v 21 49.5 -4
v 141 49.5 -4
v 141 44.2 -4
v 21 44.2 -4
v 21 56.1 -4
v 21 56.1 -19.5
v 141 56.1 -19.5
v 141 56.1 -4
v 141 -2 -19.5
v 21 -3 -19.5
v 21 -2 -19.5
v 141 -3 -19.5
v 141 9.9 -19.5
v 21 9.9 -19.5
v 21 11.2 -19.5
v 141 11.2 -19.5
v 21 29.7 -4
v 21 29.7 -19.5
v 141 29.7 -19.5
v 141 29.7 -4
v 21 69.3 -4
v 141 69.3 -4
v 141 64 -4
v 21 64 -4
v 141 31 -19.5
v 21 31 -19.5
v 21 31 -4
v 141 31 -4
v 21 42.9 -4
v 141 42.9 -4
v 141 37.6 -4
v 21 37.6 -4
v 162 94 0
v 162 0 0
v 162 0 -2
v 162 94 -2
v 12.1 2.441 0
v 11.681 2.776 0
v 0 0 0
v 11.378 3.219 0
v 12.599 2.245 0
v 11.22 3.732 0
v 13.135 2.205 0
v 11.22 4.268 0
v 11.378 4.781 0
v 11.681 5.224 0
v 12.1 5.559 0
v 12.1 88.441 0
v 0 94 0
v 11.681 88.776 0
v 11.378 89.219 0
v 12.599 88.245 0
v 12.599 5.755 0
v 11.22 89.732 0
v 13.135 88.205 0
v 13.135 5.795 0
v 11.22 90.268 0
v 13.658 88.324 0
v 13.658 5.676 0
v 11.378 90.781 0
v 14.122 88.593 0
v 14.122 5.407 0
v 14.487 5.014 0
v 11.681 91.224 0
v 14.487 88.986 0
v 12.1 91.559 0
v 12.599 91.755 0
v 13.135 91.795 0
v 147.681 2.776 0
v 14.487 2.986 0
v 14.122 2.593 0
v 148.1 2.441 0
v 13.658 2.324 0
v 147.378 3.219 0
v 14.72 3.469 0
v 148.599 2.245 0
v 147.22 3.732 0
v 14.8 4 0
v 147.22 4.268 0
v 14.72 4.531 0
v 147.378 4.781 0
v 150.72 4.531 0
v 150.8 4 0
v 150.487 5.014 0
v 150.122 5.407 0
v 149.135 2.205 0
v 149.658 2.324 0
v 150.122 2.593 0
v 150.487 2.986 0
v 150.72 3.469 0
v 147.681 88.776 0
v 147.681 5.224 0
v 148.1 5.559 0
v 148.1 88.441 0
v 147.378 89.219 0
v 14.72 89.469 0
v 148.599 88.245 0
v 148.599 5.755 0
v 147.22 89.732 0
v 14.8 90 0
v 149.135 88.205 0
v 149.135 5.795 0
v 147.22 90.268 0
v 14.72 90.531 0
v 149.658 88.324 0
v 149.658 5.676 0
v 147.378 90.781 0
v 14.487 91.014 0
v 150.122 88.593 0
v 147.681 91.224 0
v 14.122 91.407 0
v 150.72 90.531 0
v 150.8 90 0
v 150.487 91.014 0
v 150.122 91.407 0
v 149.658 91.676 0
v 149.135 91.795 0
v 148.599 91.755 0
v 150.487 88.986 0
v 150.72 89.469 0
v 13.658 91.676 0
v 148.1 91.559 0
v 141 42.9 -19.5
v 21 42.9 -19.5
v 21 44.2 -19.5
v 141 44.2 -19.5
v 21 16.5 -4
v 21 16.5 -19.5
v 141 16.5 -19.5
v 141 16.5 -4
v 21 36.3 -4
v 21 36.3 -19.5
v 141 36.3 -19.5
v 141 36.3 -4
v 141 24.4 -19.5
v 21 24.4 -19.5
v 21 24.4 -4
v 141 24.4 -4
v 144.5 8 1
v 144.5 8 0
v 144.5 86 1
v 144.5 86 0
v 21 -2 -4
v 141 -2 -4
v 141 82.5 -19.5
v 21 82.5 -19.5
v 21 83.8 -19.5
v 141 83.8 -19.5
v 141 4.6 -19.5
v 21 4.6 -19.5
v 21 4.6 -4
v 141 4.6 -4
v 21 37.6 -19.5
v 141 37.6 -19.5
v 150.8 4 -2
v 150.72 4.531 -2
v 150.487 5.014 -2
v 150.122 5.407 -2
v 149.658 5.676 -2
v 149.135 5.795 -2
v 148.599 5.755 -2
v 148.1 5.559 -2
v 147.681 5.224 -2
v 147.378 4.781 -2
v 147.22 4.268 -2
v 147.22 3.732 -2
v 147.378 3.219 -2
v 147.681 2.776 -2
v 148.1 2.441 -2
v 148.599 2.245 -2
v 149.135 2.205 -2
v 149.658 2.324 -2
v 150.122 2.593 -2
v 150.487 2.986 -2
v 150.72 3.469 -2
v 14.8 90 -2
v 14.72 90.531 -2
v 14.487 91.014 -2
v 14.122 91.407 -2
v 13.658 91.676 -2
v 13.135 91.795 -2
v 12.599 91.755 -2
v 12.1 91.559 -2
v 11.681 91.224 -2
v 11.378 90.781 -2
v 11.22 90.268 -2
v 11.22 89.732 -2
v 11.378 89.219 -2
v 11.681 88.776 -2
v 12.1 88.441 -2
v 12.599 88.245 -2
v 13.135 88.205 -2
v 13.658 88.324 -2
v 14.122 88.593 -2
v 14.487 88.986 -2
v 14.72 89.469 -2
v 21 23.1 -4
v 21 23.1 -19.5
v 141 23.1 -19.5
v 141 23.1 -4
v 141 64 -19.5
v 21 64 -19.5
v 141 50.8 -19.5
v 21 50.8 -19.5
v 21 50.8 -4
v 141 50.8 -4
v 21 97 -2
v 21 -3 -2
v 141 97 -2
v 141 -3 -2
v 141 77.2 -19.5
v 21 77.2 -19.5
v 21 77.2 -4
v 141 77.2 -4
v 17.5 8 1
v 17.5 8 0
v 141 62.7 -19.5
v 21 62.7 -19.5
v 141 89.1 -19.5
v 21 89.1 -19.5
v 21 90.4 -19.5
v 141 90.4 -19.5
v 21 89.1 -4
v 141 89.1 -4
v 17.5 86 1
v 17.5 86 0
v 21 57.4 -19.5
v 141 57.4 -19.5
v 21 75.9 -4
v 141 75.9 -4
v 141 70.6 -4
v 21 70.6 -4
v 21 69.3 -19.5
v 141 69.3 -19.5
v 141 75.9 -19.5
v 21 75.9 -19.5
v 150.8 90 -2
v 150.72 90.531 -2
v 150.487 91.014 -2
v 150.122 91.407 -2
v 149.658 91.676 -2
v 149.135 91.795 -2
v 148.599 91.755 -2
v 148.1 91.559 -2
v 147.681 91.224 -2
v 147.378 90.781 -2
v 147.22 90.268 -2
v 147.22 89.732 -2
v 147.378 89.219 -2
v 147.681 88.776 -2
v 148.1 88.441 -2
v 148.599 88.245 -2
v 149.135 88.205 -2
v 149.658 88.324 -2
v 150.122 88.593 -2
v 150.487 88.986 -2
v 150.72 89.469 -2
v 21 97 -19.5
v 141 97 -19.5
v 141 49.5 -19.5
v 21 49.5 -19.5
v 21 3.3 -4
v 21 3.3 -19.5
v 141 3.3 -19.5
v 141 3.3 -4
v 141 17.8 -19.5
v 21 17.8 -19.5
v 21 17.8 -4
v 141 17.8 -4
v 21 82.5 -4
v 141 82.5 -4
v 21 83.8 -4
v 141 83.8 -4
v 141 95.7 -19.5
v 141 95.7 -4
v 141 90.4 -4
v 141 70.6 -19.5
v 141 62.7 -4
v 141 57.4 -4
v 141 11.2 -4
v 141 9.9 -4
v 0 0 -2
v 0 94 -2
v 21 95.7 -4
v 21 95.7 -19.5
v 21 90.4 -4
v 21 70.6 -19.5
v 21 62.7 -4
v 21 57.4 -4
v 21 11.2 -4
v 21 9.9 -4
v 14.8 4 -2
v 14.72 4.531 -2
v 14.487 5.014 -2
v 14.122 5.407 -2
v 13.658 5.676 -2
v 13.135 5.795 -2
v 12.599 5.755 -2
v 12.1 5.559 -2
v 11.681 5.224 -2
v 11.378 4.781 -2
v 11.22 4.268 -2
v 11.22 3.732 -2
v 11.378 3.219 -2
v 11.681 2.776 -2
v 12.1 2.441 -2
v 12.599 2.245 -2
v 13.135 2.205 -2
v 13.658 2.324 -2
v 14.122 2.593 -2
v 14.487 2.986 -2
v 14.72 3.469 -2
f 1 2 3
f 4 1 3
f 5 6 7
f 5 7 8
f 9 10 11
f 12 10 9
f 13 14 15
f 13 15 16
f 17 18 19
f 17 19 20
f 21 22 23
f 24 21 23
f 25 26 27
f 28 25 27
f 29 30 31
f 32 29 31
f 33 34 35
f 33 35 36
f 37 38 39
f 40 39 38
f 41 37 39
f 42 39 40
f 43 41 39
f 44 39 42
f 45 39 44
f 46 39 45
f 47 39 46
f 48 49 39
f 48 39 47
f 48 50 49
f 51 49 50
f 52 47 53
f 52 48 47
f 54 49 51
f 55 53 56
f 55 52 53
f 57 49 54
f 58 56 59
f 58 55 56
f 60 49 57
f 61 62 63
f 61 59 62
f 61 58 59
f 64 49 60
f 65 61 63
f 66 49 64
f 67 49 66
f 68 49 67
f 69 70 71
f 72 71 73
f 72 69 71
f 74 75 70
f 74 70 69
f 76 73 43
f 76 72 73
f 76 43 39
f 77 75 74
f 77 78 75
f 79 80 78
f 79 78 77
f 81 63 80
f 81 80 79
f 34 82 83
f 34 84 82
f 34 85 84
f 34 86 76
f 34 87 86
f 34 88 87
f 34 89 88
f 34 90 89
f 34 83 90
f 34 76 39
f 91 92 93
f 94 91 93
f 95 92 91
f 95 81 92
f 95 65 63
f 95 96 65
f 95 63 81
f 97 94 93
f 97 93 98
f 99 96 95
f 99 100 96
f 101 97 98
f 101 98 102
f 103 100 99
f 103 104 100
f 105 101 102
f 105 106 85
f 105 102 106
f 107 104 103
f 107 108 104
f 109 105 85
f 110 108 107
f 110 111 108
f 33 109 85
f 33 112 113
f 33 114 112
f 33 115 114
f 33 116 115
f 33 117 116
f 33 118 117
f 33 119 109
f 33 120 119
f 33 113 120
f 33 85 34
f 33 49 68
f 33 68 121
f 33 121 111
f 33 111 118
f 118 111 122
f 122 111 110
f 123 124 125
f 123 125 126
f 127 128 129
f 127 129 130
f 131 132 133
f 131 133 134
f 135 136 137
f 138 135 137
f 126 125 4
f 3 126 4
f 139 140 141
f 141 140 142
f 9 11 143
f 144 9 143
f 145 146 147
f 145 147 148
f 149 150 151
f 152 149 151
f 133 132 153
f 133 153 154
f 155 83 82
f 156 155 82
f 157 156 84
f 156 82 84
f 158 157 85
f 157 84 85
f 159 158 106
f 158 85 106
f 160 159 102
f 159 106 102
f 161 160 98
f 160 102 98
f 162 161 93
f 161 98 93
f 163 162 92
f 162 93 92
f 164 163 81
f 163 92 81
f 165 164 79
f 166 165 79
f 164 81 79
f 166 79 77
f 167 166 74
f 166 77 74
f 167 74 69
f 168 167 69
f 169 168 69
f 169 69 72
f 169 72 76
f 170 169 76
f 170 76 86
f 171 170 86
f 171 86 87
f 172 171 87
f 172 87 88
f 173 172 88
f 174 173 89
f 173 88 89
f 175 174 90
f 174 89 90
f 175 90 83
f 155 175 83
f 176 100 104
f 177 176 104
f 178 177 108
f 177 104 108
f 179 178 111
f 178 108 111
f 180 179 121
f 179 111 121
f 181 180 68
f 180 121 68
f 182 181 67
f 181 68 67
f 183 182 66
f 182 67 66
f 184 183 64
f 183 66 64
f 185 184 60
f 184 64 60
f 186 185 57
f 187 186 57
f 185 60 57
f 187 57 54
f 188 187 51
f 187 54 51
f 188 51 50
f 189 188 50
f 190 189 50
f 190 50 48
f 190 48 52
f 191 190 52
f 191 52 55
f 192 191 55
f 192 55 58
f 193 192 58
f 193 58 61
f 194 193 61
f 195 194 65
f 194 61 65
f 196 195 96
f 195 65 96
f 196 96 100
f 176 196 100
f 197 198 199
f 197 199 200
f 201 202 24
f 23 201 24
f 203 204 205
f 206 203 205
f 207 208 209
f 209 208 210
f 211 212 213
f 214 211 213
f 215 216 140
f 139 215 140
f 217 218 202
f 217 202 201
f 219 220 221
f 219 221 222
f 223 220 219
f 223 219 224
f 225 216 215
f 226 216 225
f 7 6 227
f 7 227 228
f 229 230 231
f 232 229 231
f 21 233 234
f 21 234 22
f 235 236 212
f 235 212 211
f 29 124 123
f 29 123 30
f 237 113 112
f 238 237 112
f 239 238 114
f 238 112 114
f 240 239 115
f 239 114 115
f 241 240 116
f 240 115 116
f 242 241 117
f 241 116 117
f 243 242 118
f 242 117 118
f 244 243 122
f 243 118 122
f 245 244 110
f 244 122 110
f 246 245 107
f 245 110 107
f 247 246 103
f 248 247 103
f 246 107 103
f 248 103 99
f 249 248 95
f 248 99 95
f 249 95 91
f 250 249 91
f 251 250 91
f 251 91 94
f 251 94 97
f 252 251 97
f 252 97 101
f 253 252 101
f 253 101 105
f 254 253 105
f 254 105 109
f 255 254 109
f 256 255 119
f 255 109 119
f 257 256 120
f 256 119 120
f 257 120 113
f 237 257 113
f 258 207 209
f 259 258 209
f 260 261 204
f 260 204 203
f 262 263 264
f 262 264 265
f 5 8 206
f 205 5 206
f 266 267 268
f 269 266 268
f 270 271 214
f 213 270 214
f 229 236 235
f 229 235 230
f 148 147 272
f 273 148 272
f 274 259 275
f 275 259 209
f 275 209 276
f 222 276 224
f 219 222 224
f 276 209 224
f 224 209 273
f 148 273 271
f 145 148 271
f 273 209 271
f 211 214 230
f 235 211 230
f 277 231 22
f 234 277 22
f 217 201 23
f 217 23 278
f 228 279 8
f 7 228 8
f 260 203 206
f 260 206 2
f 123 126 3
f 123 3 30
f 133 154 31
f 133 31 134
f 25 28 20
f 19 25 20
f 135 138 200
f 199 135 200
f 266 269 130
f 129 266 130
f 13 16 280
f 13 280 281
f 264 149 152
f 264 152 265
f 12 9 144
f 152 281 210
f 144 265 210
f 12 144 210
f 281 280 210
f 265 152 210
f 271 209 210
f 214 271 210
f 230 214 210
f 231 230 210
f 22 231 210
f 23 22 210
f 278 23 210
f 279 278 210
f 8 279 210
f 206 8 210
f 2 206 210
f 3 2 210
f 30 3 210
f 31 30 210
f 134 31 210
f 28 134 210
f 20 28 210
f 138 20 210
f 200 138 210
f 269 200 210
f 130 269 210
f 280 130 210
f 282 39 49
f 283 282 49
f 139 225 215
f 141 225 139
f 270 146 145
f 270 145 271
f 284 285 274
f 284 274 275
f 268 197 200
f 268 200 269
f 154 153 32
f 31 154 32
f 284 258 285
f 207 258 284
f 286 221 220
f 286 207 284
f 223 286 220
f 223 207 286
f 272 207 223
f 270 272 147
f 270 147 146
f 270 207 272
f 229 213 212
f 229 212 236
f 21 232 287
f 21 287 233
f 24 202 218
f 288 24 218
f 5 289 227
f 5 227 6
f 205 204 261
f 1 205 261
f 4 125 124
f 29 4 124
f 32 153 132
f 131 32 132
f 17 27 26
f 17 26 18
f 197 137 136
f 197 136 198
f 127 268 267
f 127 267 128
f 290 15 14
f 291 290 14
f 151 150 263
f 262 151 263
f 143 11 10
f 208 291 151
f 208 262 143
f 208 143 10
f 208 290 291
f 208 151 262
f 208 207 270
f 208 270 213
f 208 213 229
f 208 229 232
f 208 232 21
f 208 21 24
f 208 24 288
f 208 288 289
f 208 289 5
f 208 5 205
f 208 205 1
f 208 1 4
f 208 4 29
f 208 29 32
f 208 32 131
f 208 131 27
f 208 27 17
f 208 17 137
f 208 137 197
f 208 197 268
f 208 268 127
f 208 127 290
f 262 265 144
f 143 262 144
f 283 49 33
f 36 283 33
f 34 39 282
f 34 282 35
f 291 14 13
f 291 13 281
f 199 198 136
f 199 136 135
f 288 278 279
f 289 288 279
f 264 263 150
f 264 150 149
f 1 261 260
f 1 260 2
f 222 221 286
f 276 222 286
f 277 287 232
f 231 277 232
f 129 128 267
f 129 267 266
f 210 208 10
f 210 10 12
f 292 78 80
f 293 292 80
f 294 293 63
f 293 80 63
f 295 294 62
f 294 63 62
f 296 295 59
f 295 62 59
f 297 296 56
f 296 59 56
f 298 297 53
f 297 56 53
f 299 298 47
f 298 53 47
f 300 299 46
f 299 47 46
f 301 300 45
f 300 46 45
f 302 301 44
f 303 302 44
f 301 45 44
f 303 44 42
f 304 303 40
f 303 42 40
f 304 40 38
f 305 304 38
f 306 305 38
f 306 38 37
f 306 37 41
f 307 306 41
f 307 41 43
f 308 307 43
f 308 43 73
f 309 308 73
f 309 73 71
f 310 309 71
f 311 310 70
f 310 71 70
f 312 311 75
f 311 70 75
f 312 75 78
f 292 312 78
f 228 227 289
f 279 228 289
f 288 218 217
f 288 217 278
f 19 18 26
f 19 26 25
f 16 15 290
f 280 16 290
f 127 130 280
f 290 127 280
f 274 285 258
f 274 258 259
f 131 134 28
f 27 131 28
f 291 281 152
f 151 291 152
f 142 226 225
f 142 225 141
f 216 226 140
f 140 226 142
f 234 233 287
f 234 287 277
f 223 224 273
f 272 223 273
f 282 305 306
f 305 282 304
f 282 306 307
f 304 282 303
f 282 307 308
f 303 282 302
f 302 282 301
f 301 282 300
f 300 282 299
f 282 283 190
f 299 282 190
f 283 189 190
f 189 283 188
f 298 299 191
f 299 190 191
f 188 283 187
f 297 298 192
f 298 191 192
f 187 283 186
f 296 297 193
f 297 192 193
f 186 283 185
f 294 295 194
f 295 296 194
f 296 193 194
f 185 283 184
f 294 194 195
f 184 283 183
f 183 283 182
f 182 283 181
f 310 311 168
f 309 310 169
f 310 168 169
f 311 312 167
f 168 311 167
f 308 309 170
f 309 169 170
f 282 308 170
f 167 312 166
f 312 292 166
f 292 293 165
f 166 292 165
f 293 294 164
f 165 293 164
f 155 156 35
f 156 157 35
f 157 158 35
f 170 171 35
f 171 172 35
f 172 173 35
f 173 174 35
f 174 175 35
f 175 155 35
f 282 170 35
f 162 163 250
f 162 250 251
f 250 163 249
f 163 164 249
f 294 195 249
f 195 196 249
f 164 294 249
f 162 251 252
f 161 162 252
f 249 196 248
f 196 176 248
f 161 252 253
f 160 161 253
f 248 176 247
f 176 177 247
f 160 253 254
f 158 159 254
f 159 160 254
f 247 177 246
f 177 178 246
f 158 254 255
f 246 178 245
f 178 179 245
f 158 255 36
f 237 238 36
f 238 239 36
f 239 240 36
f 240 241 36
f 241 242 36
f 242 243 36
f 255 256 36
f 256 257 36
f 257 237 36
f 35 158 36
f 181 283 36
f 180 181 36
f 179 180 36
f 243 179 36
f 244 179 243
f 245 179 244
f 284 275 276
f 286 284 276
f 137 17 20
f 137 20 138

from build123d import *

# Parameters (mm, degrees)
F0_W     = 162
F0_H     = 94
F0_R     = 1.8
F0_W_2   = 127
F0_H_2   = 78
F1_DEPTH = 2
F2_DEPTH = 1
F3_W     = 120
F3_H     = 100
F4_DEPTH = 17.5
F5_W     = 5.3
F5_H     = 15.5
F6_DEPTH = 141.001


with BuildPart() as f1:
    # F0 (on Top) → F1 (new body)
    with BuildSketch(Plane.XY):
        with Locations((81, 47)):
            Rectangle(F0_W, F0_H)
        with Locations((13, 4)):
            Circle(F0_R, mode=Mode.SUBTRACT)
        with Locations((149, 4)):
            Circle(F0_R, mode=Mode.SUBTRACT)
        with Locations((13, 90)):
            Circle(F0_R, mode=Mode.SUBTRACT)
        with Locations((81, 47)):
            Rectangle(F0_W_2, F0_H_2, mode=Mode.SUBTRACT)
        with Locations((149, 90)):
            Circle(F0_R, mode=Mode.SUBTRACT)
        with Locations((81, 47)):
            Rectangle(F0_W_2, F0_H_2)
    extrude(amount=-F1_DEPTH)


with BuildPart() as f2:
    # F0 (on Top) → F2 (new body)
    with BuildSketch(Plane.XY):
        with Locations((81, 47)):
            Rectangle(F0_W_2, F0_H_2)
    extrude(amount=F2_DEPTH)


with BuildPart() as f4:
    # F3 (on face) → F4 (new body)
    with BuildSketch(Plane(origin=(0, 0, -2), x_dir=(1, 0, 0), z_dir=(0, 0, -1))):
        with Locations((81, -47)):
            Rectangle(F3_W, F3_H)
    extrude(amount=F4_DEPTH)

    # F5 (on face) → F6 (cut, through all)
    with BuildSketch(Plane(origin=(21, 0, 0), x_dir=(0, -1, 0), z_dir=(-1, 0, 0))):
        with Locations((-93.05, -11.75)):
            Rectangle(F5_W, F5_H)
        with Locations((-86.45, -11.75)):
            Rectangle(F5_W, F5_H)
        with Locations((-79.85, -11.75)):
            Rectangle(F5_W, F5_H)
        with Locations((-73.25, -11.75)):
            Rectangle(F5_W, F5_H)
        with Locations((-66.65, -11.75)):
            Rectangle(F5_W, F5_H)
        with Locations((-60.05, -11.75)):
            Rectangle(F5_W, F5_H)
        with Locations((-53.45, -11.75)):
            Rectangle(F5_W, F5_H)
        with Locations((-46.85, -11.75)):
            Rectangle(F5_W, F5_H)
        with Locations((-40.25, -11.75)):
            Rectangle(F5_W, F5_H)
        with Locations((-33.65, -11.75)):
            Rectangle(F5_W, F5_H)
        with Locations((-27.05, -11.75)):
            Rectangle(F5_W, F5_H)
        with Locations((-20.45, -11.75)):
            Rectangle(F5_W, F5_H)
        with Locations((-13.85, -11.75)):
            Rectangle(F5_W, F5_H)
        with Locations((-7.25, -11.75)):
            Rectangle(F5_W, F5_H)
        with Locations((-0.65, -11.75)):
            Rectangle(F5_W, F5_H)
    extrude(amount=-F6_DEPTH, mode=Mode.SUBTRACT)


solid = Compound([f1.part, f2.part, f4.part])
